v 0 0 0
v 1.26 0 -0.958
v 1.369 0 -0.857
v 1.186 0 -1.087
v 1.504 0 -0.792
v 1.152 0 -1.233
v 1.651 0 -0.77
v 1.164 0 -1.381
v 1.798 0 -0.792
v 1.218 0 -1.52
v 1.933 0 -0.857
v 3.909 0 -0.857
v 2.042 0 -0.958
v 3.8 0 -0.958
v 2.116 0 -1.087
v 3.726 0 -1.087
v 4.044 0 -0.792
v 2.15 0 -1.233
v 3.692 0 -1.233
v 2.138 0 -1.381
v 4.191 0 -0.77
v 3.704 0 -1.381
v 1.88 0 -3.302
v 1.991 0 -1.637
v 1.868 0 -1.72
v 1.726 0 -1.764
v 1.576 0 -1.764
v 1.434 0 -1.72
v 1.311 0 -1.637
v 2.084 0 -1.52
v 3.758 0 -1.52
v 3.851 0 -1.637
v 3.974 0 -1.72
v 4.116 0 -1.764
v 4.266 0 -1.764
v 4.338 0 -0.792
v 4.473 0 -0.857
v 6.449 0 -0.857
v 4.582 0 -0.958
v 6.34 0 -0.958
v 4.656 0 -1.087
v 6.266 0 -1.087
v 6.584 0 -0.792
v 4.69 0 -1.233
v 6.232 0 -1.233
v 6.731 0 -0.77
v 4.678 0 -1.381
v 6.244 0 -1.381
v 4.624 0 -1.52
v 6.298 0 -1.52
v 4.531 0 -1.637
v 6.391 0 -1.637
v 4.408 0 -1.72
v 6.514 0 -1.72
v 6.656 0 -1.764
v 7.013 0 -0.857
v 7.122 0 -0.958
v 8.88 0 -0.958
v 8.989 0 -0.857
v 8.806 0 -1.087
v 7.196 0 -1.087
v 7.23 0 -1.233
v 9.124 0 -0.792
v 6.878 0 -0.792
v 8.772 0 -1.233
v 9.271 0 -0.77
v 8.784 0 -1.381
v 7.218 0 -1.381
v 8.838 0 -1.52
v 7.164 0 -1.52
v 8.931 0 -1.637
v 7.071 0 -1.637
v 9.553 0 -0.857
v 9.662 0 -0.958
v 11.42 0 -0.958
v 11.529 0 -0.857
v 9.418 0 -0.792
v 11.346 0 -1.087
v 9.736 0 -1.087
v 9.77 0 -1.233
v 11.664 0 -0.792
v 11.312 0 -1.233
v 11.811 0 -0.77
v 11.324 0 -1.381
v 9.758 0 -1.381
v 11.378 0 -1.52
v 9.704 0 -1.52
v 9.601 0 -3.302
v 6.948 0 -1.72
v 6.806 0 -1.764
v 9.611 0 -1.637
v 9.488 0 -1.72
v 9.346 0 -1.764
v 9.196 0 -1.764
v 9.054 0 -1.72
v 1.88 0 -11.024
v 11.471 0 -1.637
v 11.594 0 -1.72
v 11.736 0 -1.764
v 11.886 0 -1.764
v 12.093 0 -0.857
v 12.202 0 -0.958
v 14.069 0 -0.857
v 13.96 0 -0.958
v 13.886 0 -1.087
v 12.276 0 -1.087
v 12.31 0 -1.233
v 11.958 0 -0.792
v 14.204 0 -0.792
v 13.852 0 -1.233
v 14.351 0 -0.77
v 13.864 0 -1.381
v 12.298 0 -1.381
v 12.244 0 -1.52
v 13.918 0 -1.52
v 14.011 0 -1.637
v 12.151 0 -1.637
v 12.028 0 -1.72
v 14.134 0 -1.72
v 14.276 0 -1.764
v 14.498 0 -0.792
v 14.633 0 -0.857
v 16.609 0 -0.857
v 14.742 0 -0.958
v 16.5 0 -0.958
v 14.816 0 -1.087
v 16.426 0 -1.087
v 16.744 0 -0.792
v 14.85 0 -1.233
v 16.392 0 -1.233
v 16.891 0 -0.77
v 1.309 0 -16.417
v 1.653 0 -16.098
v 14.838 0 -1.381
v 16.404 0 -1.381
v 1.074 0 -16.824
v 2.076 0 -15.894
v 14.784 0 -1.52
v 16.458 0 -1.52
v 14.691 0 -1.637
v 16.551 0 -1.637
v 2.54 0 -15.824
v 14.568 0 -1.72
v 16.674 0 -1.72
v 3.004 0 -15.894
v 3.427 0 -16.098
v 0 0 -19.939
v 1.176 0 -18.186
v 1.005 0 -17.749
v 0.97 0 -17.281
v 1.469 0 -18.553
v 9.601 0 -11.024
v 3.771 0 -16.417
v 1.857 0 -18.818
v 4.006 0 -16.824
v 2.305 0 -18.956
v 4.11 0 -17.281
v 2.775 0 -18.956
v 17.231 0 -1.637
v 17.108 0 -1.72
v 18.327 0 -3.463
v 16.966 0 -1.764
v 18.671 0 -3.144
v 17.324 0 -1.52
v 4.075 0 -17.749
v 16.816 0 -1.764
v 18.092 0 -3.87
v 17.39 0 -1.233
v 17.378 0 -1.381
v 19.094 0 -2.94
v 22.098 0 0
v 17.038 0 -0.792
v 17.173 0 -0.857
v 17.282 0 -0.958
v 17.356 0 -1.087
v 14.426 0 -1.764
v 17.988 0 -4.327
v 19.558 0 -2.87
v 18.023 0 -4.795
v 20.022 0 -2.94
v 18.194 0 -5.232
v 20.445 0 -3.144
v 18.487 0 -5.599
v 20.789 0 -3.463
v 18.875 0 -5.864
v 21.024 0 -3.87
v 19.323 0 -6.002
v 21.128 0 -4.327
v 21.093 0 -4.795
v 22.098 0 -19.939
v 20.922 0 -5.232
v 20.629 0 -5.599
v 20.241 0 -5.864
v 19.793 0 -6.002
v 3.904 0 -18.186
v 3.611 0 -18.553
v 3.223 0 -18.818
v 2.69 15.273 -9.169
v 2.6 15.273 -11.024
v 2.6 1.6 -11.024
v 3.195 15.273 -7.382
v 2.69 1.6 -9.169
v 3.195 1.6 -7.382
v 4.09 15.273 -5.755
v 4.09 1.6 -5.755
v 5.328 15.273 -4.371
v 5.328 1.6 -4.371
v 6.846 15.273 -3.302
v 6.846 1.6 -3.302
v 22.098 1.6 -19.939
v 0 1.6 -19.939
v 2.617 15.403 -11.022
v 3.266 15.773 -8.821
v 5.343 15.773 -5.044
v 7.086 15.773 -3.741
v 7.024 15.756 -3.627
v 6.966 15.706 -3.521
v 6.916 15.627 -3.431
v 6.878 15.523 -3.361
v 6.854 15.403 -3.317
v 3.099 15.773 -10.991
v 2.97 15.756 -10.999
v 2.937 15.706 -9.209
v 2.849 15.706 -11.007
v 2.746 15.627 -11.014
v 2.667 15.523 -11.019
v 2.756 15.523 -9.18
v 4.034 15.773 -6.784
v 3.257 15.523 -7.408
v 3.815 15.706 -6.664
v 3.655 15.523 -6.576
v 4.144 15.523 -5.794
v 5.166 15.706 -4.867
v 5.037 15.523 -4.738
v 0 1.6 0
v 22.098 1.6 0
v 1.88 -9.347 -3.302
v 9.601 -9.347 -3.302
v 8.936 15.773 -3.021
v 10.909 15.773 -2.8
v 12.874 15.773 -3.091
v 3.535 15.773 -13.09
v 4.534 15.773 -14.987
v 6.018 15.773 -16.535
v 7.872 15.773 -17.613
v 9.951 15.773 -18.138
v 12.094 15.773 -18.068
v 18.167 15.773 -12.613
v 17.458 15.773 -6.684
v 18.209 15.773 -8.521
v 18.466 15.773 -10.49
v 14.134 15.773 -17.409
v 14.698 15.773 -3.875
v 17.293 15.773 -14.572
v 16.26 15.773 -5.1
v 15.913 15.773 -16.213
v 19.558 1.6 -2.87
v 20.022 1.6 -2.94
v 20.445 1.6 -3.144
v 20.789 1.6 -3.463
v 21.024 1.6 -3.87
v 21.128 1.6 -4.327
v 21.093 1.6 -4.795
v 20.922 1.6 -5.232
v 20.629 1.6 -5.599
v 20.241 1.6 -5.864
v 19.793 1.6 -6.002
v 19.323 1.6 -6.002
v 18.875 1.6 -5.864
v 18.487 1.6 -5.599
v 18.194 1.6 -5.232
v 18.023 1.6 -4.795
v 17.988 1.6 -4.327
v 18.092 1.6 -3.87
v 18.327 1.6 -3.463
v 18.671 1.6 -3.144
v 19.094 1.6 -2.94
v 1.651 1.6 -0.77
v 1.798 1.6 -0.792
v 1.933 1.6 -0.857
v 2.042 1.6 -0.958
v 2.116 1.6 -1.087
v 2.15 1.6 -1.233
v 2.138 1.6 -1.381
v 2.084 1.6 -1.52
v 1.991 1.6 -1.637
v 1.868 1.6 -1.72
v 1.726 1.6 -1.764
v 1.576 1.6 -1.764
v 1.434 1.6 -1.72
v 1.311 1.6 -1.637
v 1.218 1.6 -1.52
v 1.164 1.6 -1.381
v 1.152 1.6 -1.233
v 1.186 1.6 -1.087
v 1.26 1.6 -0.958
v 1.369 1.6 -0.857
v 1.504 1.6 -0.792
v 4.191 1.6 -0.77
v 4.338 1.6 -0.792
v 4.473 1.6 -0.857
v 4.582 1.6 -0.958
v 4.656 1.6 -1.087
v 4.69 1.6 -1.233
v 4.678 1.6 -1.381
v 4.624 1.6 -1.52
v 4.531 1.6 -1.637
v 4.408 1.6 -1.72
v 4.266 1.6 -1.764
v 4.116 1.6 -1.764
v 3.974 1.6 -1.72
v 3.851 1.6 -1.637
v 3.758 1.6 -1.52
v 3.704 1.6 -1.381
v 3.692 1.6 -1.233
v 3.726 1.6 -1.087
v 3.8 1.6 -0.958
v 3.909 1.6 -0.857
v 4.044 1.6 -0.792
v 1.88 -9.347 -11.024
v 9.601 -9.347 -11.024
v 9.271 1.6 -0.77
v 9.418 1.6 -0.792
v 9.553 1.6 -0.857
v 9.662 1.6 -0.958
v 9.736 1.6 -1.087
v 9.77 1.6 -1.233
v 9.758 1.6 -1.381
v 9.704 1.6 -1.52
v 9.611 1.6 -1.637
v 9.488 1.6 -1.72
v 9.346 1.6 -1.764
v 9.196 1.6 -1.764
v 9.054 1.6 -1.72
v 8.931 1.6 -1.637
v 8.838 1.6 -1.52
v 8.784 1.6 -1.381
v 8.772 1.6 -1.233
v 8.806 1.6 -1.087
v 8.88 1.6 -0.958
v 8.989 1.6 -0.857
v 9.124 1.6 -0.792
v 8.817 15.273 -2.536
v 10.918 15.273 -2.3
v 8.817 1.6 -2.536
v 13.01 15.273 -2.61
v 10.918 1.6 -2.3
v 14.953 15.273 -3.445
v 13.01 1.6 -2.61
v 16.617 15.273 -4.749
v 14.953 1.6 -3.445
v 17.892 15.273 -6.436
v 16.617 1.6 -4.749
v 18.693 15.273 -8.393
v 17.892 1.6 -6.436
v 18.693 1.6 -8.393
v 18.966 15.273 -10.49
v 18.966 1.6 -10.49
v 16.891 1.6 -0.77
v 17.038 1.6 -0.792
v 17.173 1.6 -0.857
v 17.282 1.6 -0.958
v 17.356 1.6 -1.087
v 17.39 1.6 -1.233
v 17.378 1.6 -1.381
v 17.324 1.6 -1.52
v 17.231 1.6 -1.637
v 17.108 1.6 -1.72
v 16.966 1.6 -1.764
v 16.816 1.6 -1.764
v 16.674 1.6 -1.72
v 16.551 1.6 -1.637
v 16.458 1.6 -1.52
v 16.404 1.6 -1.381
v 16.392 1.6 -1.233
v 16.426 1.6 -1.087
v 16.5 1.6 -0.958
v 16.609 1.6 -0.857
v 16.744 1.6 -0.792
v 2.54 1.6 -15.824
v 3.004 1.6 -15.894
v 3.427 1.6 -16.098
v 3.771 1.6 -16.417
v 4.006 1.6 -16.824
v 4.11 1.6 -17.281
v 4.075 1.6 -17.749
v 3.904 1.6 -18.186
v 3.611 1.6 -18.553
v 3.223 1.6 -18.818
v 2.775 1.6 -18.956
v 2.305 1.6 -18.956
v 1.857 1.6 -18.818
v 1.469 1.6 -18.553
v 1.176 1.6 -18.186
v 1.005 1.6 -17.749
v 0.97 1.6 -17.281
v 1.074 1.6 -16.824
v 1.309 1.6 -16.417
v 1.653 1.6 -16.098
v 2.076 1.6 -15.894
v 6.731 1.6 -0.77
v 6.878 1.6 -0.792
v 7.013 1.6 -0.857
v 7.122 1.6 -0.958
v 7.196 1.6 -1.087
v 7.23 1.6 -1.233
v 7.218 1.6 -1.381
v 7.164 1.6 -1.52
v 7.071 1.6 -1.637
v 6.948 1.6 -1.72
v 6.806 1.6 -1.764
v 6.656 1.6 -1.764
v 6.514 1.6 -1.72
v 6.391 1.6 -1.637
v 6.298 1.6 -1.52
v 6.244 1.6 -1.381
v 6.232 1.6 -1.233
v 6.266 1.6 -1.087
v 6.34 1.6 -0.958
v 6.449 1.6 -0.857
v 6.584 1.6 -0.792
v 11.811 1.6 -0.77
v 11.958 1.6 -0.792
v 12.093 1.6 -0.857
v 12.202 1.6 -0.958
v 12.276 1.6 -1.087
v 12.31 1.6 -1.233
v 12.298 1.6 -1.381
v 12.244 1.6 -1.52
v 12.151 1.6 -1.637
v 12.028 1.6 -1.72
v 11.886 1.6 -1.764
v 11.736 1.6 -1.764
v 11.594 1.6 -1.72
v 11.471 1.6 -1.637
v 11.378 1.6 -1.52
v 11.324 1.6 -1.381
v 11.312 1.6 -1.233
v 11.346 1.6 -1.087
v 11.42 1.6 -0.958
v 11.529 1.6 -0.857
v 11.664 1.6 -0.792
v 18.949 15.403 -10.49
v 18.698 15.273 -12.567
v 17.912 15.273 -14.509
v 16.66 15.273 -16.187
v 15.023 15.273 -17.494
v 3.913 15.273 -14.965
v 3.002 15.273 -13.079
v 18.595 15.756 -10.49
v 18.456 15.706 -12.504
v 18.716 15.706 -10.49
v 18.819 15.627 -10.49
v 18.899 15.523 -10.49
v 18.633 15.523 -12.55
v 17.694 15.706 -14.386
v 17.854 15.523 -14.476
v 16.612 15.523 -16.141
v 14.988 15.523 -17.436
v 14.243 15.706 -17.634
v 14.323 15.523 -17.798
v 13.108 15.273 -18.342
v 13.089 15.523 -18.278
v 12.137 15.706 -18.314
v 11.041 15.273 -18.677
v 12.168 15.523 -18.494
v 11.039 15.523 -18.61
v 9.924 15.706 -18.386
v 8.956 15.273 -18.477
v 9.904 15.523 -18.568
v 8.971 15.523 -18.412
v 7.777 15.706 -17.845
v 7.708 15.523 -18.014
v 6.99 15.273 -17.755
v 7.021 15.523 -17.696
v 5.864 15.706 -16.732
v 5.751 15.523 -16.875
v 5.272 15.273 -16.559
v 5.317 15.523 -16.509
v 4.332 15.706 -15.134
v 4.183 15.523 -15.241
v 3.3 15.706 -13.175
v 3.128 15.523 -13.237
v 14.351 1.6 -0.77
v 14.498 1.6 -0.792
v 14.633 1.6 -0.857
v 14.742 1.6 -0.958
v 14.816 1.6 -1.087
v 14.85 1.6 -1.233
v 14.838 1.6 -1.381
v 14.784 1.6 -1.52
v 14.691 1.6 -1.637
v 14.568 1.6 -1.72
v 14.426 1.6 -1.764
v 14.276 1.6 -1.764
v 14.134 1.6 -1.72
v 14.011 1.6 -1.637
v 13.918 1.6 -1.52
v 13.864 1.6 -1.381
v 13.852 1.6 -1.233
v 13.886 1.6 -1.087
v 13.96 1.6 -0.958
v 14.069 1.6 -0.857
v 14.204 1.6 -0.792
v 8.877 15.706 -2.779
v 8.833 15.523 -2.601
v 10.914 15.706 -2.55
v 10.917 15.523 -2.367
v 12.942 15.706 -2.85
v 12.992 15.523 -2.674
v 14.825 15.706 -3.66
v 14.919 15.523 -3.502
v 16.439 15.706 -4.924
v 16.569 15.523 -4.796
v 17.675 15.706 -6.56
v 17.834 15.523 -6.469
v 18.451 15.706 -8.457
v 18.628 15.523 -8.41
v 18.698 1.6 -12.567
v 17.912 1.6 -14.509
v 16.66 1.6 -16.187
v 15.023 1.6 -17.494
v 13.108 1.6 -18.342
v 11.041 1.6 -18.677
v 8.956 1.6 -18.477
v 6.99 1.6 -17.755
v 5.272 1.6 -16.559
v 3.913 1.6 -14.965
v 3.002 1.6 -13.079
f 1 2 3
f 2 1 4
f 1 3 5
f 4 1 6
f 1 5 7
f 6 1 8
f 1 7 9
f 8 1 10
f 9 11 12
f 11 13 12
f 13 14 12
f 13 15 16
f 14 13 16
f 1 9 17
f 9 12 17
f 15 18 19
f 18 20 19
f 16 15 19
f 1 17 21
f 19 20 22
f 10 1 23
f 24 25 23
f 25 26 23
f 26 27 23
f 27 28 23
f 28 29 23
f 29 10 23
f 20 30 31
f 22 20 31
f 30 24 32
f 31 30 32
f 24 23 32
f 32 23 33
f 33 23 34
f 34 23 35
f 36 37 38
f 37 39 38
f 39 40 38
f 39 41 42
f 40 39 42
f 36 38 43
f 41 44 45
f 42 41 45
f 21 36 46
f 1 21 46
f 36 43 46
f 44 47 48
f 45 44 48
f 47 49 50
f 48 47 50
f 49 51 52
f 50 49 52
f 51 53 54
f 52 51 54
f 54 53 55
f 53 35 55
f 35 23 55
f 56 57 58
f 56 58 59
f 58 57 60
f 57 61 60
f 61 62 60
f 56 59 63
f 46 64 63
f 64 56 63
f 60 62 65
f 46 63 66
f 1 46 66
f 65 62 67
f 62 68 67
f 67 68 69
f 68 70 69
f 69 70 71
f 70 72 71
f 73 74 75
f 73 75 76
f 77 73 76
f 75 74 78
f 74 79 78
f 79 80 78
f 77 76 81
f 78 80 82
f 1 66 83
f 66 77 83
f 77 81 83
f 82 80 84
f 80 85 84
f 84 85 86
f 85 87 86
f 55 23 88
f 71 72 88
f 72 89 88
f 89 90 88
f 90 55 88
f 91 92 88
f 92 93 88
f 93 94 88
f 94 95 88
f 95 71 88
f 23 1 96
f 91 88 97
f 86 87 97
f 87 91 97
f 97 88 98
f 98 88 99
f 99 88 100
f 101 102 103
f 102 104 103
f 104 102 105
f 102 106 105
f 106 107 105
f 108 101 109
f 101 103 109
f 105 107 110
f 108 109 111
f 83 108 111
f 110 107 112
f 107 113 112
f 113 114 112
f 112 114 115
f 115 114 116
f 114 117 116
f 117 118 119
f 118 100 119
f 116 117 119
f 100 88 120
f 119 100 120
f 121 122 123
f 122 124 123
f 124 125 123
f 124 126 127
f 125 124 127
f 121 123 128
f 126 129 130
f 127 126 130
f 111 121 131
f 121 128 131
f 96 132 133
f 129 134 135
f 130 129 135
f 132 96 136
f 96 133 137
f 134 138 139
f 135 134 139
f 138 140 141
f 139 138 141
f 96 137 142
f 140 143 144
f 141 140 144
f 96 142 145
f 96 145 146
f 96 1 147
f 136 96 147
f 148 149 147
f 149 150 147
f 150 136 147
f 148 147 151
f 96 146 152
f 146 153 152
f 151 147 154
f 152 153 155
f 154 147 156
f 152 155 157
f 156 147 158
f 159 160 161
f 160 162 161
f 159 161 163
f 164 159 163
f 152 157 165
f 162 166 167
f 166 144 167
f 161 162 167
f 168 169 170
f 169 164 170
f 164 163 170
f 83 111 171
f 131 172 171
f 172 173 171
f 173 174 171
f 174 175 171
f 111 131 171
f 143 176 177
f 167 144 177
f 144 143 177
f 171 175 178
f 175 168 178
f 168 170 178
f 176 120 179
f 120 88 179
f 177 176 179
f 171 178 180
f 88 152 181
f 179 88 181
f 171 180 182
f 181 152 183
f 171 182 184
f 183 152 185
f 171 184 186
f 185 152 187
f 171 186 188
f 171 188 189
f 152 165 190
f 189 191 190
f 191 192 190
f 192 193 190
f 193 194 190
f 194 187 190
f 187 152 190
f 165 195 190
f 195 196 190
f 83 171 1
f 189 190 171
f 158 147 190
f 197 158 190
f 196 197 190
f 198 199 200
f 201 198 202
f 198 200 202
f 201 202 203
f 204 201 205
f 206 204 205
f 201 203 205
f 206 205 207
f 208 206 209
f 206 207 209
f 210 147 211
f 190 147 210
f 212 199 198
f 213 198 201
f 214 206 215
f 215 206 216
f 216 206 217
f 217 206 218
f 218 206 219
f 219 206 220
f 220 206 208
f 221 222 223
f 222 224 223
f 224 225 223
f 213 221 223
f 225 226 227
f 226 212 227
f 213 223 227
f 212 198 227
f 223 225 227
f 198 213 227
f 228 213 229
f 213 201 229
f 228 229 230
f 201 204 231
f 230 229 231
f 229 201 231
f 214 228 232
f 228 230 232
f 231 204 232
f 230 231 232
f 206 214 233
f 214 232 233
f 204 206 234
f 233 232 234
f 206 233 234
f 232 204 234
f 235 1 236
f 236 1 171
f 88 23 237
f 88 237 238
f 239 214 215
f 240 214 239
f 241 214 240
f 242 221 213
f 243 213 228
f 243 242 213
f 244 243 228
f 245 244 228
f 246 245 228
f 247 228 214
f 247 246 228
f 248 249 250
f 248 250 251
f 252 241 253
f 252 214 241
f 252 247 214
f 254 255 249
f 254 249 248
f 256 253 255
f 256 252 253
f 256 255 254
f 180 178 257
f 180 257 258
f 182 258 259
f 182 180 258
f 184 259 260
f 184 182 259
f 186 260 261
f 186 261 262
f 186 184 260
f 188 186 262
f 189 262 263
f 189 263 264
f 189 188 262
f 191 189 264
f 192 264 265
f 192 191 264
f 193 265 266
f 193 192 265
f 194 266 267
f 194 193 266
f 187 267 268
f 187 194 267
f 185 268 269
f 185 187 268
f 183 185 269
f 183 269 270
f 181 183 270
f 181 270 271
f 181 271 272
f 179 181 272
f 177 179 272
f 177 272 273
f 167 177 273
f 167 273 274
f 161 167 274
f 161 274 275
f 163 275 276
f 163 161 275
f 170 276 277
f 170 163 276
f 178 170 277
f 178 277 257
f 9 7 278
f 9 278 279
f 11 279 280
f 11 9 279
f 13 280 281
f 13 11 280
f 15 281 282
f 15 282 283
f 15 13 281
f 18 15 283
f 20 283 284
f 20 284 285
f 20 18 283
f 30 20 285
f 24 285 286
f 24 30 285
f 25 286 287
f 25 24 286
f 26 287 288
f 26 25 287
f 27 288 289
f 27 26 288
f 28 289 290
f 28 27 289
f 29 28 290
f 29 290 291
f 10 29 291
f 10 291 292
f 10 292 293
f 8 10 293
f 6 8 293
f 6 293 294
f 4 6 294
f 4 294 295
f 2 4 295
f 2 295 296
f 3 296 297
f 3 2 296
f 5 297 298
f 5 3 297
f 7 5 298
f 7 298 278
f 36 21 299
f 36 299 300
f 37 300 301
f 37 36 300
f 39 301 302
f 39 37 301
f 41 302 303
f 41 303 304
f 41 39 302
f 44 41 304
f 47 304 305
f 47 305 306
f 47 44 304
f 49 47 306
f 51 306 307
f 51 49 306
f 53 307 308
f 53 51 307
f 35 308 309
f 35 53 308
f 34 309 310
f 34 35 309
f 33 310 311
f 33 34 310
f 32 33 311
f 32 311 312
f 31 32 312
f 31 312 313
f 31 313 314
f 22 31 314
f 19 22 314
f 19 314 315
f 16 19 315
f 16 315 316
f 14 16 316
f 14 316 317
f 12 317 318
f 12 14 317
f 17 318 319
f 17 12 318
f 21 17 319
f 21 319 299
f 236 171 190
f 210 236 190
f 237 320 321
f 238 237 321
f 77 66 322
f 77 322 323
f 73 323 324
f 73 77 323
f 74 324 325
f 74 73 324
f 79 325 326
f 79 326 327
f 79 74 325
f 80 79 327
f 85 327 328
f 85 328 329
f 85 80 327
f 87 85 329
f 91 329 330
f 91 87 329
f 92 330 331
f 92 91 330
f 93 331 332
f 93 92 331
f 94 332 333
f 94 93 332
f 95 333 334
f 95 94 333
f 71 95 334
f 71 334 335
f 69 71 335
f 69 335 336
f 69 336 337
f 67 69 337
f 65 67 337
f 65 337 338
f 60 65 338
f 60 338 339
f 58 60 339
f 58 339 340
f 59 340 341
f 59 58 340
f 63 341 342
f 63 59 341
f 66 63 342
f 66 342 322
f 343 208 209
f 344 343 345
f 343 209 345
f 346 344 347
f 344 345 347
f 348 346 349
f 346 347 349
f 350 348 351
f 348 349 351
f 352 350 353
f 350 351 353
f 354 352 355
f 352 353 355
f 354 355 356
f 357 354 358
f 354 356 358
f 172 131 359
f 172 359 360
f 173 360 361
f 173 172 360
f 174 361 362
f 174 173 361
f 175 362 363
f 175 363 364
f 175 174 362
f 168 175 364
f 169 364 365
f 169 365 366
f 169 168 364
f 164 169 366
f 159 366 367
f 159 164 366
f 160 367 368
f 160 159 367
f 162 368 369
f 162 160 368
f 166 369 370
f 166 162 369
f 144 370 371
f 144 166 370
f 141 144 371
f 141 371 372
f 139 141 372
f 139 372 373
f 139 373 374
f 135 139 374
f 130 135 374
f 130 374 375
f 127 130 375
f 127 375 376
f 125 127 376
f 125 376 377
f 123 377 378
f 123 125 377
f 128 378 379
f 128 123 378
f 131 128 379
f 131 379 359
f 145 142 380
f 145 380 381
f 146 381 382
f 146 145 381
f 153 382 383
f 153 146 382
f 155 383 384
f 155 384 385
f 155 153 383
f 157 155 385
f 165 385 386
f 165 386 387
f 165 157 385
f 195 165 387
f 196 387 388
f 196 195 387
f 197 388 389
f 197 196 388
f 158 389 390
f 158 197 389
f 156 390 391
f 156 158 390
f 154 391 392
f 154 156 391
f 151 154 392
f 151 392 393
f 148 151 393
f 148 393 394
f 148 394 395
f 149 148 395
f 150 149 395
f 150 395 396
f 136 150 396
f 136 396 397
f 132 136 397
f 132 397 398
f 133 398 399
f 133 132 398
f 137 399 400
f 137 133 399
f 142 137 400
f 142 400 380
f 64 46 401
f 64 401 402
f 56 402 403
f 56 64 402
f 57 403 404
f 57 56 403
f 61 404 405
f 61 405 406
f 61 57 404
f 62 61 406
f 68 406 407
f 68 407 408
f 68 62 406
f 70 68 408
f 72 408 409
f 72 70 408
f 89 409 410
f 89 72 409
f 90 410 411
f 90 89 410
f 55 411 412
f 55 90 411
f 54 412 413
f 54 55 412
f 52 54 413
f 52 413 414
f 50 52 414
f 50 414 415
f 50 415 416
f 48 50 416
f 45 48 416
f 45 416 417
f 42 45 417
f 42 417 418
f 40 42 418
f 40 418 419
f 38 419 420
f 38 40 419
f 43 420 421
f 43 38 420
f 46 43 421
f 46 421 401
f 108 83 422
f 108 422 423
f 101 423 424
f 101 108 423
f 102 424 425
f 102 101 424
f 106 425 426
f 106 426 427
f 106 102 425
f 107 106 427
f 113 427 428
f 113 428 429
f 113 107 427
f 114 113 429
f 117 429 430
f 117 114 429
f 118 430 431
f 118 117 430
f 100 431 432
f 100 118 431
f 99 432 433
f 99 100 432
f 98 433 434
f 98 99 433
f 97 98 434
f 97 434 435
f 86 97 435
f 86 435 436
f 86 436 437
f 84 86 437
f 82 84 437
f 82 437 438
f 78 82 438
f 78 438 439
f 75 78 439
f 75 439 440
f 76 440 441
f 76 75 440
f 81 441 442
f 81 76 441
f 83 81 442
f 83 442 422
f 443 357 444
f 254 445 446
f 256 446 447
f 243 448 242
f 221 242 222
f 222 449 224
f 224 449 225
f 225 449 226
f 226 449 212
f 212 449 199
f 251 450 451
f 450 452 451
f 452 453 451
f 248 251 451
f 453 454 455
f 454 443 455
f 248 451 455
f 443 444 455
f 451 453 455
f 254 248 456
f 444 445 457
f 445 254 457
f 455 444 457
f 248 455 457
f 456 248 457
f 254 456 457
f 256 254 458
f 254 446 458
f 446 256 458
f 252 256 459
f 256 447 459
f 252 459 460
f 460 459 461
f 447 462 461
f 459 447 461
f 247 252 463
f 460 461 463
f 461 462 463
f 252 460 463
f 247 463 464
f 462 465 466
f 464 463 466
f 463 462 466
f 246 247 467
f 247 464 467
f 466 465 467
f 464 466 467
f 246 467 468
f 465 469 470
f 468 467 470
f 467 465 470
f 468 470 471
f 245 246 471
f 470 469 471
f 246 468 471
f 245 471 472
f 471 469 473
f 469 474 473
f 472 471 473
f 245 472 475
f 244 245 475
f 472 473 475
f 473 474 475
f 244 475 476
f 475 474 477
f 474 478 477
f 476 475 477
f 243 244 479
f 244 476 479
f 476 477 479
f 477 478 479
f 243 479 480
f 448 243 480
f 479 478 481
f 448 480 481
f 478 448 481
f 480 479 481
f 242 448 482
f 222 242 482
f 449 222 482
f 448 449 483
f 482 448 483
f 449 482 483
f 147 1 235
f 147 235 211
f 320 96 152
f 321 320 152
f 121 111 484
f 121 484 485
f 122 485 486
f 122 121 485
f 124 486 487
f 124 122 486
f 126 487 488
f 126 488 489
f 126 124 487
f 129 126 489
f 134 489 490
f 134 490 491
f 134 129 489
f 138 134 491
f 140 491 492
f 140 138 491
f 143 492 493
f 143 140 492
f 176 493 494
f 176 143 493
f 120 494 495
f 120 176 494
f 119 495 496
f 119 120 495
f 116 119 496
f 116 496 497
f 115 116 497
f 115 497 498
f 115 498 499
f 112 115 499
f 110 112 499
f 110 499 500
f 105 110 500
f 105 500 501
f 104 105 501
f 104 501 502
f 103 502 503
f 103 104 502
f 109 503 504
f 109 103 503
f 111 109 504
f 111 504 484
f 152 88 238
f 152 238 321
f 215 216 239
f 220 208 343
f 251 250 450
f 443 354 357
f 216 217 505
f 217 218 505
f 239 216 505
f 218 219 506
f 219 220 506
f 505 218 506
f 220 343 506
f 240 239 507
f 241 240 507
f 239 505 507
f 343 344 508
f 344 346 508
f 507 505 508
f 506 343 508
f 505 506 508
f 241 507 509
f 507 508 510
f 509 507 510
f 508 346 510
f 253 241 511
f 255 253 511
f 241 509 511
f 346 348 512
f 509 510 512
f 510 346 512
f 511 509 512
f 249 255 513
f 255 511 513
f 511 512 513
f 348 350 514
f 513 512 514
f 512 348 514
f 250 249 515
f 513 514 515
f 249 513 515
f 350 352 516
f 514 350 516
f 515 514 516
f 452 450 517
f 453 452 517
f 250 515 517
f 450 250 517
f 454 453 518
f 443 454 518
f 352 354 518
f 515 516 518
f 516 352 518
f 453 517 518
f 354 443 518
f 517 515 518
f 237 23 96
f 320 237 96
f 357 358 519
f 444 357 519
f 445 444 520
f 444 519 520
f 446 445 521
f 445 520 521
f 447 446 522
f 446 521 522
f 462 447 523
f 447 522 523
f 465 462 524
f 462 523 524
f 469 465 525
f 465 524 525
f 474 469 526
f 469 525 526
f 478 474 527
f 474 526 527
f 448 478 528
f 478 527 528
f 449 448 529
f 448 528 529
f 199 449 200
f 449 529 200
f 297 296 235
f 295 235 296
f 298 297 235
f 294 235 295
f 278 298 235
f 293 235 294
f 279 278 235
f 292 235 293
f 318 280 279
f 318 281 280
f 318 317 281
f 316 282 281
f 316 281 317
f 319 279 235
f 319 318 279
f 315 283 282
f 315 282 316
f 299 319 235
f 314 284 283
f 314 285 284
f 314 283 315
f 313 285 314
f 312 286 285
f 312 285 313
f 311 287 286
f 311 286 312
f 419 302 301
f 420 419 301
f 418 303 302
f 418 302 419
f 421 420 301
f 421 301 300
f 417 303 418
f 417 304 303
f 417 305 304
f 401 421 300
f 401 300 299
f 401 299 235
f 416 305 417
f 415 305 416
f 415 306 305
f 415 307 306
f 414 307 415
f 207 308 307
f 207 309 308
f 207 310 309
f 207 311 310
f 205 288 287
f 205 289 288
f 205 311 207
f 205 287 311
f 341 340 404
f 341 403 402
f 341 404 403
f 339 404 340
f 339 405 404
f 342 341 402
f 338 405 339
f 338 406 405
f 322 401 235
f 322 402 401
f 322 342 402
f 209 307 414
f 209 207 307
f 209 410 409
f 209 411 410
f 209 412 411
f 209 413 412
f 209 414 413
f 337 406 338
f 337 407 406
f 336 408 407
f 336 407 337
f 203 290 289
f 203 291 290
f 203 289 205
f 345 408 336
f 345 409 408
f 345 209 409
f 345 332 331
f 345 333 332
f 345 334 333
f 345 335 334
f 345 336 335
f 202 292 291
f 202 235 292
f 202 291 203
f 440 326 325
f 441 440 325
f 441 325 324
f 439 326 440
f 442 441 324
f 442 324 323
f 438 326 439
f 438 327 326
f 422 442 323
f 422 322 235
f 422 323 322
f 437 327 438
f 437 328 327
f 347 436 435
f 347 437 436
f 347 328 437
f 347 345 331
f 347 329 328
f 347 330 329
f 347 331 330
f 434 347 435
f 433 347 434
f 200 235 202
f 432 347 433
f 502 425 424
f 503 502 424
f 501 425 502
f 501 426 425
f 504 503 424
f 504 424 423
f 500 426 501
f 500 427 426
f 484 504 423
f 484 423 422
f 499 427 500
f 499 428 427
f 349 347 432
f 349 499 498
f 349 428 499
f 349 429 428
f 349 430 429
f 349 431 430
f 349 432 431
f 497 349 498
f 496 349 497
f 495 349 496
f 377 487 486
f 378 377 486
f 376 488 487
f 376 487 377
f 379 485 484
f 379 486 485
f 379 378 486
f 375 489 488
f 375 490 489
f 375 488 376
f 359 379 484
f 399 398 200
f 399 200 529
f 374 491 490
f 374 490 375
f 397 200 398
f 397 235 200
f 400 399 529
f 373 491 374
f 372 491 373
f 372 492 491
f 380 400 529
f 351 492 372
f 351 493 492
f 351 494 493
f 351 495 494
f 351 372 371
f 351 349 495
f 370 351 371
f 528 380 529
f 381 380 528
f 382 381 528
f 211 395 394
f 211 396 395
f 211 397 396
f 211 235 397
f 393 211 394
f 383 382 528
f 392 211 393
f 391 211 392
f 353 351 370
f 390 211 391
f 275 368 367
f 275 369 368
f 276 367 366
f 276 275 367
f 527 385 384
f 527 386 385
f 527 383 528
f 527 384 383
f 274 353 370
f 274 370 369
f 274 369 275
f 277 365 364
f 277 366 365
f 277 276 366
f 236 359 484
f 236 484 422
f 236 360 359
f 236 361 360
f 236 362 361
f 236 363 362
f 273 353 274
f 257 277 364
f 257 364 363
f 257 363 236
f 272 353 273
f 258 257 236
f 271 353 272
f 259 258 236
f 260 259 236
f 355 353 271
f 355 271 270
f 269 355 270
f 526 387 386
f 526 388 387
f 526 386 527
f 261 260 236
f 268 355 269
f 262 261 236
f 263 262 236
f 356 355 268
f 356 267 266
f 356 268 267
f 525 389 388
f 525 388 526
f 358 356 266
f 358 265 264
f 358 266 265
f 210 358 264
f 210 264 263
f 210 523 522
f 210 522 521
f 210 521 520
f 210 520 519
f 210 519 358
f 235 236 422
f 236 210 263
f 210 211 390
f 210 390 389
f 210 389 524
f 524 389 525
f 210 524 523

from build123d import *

# Parameters (mm, degrees)
SKETCH1_W           = 22.098
SKETCH1_H           = 19.939
SKETCH1_R           = 0.5
SKETCH1_R_2         = 1.5748
BOSS_EXTRUDE1_DEPTH = 1.6002
SKETCH1_3_W         = 7.7216
SKETCH1_3_H         = 7.7216
BOSS_EXTRUDE2_DEPTH = 9.3472
SKETCH1_4_R         = 8.1915
BOSS_EXTRUDE3_DEPTH = 15.7734
FILLET1_R           = 0.5


with BuildPart() as part:
    # Sketch1 → Boss-Extrude1 (new body)
    with BuildSketch(Plane(origin=(0, 0, 0), x_dir=(1, 0, 0), z_dir=(0, 1, 0))):
        with Locations((11.049, 9.9695)):
            Rectangle(SKETCH1_W, SKETCH1_H)
        with Locations((1.651, 1.27)):
            Circle(SKETCH1_R, mode=Mode.SUBTRACT)
        with Locations((4.191, 1.27)):
            Circle(SKETCH1_R, mode=Mode.SUBTRACT)
        with Locations((6.731, 1.27)):
            Circle(SKETCH1_R, mode=Mode.SUBTRACT)
        with Locations((9.271, 1.27)):
            Circle(SKETCH1_R, mode=Mode.SUBTRACT)
        with Locations((11.811, 1.27)):
            Circle(SKETCH1_R, mode=Mode.SUBTRACT)
        with Locations((14.351, 1.27)):
            Circle(SKETCH1_R, mode=Mode.SUBTRACT)
        with Locations((16.891, 1.27)):
            Circle(SKETCH1_R, mode=Mode.SUBTRACT)
        with Locations((19.558, 4.445)):
            Circle(SKETCH1_R_2, mode=Mode.SUBTRACT)
        with Locations((2.54, 17.399)):
            Circle(SKETCH1_R_2, mode=Mode.SUBTRACT)
    extrude(amount=BOSS_EXTRUDE1_DEPTH)

    # Sketch1<3> → Boss-Extrude2 (add)
    with BuildSketch(Plane(origin=(0, 0, 0), x_dir=(1, 0, 0), z_dir=(0, 1, 0))):
        with Locations((5.7404, 7.1628)):
            Rectangle(SKETCH1_3_W, SKETCH1_3_H)
    extrude(amount=-BOSS_EXTRUDE2_DEPTH)

    # Sketch1<4> → Boss-Extrude3 (add)
    with BuildSketch(Plane(origin=(0, 0, 0), x_dir=(1, 0, 0), z_dir=(0, 1, 0))):
        with Locations((10.774120393, 10.4902)):
            Circle(SKETCH1_4_R)
    extrude(amount=BOSS_EXTRUDE3_DEPTH)

    # Fillet1
    fillet1_edges = [part.edges().sort_by_distance(p)[0] for p in [
        (2.582620393, 15.7734, -10.4902),
    ]]
    fillet(fillet1_edges, radius=FILLET1_R)


solid = part.part
